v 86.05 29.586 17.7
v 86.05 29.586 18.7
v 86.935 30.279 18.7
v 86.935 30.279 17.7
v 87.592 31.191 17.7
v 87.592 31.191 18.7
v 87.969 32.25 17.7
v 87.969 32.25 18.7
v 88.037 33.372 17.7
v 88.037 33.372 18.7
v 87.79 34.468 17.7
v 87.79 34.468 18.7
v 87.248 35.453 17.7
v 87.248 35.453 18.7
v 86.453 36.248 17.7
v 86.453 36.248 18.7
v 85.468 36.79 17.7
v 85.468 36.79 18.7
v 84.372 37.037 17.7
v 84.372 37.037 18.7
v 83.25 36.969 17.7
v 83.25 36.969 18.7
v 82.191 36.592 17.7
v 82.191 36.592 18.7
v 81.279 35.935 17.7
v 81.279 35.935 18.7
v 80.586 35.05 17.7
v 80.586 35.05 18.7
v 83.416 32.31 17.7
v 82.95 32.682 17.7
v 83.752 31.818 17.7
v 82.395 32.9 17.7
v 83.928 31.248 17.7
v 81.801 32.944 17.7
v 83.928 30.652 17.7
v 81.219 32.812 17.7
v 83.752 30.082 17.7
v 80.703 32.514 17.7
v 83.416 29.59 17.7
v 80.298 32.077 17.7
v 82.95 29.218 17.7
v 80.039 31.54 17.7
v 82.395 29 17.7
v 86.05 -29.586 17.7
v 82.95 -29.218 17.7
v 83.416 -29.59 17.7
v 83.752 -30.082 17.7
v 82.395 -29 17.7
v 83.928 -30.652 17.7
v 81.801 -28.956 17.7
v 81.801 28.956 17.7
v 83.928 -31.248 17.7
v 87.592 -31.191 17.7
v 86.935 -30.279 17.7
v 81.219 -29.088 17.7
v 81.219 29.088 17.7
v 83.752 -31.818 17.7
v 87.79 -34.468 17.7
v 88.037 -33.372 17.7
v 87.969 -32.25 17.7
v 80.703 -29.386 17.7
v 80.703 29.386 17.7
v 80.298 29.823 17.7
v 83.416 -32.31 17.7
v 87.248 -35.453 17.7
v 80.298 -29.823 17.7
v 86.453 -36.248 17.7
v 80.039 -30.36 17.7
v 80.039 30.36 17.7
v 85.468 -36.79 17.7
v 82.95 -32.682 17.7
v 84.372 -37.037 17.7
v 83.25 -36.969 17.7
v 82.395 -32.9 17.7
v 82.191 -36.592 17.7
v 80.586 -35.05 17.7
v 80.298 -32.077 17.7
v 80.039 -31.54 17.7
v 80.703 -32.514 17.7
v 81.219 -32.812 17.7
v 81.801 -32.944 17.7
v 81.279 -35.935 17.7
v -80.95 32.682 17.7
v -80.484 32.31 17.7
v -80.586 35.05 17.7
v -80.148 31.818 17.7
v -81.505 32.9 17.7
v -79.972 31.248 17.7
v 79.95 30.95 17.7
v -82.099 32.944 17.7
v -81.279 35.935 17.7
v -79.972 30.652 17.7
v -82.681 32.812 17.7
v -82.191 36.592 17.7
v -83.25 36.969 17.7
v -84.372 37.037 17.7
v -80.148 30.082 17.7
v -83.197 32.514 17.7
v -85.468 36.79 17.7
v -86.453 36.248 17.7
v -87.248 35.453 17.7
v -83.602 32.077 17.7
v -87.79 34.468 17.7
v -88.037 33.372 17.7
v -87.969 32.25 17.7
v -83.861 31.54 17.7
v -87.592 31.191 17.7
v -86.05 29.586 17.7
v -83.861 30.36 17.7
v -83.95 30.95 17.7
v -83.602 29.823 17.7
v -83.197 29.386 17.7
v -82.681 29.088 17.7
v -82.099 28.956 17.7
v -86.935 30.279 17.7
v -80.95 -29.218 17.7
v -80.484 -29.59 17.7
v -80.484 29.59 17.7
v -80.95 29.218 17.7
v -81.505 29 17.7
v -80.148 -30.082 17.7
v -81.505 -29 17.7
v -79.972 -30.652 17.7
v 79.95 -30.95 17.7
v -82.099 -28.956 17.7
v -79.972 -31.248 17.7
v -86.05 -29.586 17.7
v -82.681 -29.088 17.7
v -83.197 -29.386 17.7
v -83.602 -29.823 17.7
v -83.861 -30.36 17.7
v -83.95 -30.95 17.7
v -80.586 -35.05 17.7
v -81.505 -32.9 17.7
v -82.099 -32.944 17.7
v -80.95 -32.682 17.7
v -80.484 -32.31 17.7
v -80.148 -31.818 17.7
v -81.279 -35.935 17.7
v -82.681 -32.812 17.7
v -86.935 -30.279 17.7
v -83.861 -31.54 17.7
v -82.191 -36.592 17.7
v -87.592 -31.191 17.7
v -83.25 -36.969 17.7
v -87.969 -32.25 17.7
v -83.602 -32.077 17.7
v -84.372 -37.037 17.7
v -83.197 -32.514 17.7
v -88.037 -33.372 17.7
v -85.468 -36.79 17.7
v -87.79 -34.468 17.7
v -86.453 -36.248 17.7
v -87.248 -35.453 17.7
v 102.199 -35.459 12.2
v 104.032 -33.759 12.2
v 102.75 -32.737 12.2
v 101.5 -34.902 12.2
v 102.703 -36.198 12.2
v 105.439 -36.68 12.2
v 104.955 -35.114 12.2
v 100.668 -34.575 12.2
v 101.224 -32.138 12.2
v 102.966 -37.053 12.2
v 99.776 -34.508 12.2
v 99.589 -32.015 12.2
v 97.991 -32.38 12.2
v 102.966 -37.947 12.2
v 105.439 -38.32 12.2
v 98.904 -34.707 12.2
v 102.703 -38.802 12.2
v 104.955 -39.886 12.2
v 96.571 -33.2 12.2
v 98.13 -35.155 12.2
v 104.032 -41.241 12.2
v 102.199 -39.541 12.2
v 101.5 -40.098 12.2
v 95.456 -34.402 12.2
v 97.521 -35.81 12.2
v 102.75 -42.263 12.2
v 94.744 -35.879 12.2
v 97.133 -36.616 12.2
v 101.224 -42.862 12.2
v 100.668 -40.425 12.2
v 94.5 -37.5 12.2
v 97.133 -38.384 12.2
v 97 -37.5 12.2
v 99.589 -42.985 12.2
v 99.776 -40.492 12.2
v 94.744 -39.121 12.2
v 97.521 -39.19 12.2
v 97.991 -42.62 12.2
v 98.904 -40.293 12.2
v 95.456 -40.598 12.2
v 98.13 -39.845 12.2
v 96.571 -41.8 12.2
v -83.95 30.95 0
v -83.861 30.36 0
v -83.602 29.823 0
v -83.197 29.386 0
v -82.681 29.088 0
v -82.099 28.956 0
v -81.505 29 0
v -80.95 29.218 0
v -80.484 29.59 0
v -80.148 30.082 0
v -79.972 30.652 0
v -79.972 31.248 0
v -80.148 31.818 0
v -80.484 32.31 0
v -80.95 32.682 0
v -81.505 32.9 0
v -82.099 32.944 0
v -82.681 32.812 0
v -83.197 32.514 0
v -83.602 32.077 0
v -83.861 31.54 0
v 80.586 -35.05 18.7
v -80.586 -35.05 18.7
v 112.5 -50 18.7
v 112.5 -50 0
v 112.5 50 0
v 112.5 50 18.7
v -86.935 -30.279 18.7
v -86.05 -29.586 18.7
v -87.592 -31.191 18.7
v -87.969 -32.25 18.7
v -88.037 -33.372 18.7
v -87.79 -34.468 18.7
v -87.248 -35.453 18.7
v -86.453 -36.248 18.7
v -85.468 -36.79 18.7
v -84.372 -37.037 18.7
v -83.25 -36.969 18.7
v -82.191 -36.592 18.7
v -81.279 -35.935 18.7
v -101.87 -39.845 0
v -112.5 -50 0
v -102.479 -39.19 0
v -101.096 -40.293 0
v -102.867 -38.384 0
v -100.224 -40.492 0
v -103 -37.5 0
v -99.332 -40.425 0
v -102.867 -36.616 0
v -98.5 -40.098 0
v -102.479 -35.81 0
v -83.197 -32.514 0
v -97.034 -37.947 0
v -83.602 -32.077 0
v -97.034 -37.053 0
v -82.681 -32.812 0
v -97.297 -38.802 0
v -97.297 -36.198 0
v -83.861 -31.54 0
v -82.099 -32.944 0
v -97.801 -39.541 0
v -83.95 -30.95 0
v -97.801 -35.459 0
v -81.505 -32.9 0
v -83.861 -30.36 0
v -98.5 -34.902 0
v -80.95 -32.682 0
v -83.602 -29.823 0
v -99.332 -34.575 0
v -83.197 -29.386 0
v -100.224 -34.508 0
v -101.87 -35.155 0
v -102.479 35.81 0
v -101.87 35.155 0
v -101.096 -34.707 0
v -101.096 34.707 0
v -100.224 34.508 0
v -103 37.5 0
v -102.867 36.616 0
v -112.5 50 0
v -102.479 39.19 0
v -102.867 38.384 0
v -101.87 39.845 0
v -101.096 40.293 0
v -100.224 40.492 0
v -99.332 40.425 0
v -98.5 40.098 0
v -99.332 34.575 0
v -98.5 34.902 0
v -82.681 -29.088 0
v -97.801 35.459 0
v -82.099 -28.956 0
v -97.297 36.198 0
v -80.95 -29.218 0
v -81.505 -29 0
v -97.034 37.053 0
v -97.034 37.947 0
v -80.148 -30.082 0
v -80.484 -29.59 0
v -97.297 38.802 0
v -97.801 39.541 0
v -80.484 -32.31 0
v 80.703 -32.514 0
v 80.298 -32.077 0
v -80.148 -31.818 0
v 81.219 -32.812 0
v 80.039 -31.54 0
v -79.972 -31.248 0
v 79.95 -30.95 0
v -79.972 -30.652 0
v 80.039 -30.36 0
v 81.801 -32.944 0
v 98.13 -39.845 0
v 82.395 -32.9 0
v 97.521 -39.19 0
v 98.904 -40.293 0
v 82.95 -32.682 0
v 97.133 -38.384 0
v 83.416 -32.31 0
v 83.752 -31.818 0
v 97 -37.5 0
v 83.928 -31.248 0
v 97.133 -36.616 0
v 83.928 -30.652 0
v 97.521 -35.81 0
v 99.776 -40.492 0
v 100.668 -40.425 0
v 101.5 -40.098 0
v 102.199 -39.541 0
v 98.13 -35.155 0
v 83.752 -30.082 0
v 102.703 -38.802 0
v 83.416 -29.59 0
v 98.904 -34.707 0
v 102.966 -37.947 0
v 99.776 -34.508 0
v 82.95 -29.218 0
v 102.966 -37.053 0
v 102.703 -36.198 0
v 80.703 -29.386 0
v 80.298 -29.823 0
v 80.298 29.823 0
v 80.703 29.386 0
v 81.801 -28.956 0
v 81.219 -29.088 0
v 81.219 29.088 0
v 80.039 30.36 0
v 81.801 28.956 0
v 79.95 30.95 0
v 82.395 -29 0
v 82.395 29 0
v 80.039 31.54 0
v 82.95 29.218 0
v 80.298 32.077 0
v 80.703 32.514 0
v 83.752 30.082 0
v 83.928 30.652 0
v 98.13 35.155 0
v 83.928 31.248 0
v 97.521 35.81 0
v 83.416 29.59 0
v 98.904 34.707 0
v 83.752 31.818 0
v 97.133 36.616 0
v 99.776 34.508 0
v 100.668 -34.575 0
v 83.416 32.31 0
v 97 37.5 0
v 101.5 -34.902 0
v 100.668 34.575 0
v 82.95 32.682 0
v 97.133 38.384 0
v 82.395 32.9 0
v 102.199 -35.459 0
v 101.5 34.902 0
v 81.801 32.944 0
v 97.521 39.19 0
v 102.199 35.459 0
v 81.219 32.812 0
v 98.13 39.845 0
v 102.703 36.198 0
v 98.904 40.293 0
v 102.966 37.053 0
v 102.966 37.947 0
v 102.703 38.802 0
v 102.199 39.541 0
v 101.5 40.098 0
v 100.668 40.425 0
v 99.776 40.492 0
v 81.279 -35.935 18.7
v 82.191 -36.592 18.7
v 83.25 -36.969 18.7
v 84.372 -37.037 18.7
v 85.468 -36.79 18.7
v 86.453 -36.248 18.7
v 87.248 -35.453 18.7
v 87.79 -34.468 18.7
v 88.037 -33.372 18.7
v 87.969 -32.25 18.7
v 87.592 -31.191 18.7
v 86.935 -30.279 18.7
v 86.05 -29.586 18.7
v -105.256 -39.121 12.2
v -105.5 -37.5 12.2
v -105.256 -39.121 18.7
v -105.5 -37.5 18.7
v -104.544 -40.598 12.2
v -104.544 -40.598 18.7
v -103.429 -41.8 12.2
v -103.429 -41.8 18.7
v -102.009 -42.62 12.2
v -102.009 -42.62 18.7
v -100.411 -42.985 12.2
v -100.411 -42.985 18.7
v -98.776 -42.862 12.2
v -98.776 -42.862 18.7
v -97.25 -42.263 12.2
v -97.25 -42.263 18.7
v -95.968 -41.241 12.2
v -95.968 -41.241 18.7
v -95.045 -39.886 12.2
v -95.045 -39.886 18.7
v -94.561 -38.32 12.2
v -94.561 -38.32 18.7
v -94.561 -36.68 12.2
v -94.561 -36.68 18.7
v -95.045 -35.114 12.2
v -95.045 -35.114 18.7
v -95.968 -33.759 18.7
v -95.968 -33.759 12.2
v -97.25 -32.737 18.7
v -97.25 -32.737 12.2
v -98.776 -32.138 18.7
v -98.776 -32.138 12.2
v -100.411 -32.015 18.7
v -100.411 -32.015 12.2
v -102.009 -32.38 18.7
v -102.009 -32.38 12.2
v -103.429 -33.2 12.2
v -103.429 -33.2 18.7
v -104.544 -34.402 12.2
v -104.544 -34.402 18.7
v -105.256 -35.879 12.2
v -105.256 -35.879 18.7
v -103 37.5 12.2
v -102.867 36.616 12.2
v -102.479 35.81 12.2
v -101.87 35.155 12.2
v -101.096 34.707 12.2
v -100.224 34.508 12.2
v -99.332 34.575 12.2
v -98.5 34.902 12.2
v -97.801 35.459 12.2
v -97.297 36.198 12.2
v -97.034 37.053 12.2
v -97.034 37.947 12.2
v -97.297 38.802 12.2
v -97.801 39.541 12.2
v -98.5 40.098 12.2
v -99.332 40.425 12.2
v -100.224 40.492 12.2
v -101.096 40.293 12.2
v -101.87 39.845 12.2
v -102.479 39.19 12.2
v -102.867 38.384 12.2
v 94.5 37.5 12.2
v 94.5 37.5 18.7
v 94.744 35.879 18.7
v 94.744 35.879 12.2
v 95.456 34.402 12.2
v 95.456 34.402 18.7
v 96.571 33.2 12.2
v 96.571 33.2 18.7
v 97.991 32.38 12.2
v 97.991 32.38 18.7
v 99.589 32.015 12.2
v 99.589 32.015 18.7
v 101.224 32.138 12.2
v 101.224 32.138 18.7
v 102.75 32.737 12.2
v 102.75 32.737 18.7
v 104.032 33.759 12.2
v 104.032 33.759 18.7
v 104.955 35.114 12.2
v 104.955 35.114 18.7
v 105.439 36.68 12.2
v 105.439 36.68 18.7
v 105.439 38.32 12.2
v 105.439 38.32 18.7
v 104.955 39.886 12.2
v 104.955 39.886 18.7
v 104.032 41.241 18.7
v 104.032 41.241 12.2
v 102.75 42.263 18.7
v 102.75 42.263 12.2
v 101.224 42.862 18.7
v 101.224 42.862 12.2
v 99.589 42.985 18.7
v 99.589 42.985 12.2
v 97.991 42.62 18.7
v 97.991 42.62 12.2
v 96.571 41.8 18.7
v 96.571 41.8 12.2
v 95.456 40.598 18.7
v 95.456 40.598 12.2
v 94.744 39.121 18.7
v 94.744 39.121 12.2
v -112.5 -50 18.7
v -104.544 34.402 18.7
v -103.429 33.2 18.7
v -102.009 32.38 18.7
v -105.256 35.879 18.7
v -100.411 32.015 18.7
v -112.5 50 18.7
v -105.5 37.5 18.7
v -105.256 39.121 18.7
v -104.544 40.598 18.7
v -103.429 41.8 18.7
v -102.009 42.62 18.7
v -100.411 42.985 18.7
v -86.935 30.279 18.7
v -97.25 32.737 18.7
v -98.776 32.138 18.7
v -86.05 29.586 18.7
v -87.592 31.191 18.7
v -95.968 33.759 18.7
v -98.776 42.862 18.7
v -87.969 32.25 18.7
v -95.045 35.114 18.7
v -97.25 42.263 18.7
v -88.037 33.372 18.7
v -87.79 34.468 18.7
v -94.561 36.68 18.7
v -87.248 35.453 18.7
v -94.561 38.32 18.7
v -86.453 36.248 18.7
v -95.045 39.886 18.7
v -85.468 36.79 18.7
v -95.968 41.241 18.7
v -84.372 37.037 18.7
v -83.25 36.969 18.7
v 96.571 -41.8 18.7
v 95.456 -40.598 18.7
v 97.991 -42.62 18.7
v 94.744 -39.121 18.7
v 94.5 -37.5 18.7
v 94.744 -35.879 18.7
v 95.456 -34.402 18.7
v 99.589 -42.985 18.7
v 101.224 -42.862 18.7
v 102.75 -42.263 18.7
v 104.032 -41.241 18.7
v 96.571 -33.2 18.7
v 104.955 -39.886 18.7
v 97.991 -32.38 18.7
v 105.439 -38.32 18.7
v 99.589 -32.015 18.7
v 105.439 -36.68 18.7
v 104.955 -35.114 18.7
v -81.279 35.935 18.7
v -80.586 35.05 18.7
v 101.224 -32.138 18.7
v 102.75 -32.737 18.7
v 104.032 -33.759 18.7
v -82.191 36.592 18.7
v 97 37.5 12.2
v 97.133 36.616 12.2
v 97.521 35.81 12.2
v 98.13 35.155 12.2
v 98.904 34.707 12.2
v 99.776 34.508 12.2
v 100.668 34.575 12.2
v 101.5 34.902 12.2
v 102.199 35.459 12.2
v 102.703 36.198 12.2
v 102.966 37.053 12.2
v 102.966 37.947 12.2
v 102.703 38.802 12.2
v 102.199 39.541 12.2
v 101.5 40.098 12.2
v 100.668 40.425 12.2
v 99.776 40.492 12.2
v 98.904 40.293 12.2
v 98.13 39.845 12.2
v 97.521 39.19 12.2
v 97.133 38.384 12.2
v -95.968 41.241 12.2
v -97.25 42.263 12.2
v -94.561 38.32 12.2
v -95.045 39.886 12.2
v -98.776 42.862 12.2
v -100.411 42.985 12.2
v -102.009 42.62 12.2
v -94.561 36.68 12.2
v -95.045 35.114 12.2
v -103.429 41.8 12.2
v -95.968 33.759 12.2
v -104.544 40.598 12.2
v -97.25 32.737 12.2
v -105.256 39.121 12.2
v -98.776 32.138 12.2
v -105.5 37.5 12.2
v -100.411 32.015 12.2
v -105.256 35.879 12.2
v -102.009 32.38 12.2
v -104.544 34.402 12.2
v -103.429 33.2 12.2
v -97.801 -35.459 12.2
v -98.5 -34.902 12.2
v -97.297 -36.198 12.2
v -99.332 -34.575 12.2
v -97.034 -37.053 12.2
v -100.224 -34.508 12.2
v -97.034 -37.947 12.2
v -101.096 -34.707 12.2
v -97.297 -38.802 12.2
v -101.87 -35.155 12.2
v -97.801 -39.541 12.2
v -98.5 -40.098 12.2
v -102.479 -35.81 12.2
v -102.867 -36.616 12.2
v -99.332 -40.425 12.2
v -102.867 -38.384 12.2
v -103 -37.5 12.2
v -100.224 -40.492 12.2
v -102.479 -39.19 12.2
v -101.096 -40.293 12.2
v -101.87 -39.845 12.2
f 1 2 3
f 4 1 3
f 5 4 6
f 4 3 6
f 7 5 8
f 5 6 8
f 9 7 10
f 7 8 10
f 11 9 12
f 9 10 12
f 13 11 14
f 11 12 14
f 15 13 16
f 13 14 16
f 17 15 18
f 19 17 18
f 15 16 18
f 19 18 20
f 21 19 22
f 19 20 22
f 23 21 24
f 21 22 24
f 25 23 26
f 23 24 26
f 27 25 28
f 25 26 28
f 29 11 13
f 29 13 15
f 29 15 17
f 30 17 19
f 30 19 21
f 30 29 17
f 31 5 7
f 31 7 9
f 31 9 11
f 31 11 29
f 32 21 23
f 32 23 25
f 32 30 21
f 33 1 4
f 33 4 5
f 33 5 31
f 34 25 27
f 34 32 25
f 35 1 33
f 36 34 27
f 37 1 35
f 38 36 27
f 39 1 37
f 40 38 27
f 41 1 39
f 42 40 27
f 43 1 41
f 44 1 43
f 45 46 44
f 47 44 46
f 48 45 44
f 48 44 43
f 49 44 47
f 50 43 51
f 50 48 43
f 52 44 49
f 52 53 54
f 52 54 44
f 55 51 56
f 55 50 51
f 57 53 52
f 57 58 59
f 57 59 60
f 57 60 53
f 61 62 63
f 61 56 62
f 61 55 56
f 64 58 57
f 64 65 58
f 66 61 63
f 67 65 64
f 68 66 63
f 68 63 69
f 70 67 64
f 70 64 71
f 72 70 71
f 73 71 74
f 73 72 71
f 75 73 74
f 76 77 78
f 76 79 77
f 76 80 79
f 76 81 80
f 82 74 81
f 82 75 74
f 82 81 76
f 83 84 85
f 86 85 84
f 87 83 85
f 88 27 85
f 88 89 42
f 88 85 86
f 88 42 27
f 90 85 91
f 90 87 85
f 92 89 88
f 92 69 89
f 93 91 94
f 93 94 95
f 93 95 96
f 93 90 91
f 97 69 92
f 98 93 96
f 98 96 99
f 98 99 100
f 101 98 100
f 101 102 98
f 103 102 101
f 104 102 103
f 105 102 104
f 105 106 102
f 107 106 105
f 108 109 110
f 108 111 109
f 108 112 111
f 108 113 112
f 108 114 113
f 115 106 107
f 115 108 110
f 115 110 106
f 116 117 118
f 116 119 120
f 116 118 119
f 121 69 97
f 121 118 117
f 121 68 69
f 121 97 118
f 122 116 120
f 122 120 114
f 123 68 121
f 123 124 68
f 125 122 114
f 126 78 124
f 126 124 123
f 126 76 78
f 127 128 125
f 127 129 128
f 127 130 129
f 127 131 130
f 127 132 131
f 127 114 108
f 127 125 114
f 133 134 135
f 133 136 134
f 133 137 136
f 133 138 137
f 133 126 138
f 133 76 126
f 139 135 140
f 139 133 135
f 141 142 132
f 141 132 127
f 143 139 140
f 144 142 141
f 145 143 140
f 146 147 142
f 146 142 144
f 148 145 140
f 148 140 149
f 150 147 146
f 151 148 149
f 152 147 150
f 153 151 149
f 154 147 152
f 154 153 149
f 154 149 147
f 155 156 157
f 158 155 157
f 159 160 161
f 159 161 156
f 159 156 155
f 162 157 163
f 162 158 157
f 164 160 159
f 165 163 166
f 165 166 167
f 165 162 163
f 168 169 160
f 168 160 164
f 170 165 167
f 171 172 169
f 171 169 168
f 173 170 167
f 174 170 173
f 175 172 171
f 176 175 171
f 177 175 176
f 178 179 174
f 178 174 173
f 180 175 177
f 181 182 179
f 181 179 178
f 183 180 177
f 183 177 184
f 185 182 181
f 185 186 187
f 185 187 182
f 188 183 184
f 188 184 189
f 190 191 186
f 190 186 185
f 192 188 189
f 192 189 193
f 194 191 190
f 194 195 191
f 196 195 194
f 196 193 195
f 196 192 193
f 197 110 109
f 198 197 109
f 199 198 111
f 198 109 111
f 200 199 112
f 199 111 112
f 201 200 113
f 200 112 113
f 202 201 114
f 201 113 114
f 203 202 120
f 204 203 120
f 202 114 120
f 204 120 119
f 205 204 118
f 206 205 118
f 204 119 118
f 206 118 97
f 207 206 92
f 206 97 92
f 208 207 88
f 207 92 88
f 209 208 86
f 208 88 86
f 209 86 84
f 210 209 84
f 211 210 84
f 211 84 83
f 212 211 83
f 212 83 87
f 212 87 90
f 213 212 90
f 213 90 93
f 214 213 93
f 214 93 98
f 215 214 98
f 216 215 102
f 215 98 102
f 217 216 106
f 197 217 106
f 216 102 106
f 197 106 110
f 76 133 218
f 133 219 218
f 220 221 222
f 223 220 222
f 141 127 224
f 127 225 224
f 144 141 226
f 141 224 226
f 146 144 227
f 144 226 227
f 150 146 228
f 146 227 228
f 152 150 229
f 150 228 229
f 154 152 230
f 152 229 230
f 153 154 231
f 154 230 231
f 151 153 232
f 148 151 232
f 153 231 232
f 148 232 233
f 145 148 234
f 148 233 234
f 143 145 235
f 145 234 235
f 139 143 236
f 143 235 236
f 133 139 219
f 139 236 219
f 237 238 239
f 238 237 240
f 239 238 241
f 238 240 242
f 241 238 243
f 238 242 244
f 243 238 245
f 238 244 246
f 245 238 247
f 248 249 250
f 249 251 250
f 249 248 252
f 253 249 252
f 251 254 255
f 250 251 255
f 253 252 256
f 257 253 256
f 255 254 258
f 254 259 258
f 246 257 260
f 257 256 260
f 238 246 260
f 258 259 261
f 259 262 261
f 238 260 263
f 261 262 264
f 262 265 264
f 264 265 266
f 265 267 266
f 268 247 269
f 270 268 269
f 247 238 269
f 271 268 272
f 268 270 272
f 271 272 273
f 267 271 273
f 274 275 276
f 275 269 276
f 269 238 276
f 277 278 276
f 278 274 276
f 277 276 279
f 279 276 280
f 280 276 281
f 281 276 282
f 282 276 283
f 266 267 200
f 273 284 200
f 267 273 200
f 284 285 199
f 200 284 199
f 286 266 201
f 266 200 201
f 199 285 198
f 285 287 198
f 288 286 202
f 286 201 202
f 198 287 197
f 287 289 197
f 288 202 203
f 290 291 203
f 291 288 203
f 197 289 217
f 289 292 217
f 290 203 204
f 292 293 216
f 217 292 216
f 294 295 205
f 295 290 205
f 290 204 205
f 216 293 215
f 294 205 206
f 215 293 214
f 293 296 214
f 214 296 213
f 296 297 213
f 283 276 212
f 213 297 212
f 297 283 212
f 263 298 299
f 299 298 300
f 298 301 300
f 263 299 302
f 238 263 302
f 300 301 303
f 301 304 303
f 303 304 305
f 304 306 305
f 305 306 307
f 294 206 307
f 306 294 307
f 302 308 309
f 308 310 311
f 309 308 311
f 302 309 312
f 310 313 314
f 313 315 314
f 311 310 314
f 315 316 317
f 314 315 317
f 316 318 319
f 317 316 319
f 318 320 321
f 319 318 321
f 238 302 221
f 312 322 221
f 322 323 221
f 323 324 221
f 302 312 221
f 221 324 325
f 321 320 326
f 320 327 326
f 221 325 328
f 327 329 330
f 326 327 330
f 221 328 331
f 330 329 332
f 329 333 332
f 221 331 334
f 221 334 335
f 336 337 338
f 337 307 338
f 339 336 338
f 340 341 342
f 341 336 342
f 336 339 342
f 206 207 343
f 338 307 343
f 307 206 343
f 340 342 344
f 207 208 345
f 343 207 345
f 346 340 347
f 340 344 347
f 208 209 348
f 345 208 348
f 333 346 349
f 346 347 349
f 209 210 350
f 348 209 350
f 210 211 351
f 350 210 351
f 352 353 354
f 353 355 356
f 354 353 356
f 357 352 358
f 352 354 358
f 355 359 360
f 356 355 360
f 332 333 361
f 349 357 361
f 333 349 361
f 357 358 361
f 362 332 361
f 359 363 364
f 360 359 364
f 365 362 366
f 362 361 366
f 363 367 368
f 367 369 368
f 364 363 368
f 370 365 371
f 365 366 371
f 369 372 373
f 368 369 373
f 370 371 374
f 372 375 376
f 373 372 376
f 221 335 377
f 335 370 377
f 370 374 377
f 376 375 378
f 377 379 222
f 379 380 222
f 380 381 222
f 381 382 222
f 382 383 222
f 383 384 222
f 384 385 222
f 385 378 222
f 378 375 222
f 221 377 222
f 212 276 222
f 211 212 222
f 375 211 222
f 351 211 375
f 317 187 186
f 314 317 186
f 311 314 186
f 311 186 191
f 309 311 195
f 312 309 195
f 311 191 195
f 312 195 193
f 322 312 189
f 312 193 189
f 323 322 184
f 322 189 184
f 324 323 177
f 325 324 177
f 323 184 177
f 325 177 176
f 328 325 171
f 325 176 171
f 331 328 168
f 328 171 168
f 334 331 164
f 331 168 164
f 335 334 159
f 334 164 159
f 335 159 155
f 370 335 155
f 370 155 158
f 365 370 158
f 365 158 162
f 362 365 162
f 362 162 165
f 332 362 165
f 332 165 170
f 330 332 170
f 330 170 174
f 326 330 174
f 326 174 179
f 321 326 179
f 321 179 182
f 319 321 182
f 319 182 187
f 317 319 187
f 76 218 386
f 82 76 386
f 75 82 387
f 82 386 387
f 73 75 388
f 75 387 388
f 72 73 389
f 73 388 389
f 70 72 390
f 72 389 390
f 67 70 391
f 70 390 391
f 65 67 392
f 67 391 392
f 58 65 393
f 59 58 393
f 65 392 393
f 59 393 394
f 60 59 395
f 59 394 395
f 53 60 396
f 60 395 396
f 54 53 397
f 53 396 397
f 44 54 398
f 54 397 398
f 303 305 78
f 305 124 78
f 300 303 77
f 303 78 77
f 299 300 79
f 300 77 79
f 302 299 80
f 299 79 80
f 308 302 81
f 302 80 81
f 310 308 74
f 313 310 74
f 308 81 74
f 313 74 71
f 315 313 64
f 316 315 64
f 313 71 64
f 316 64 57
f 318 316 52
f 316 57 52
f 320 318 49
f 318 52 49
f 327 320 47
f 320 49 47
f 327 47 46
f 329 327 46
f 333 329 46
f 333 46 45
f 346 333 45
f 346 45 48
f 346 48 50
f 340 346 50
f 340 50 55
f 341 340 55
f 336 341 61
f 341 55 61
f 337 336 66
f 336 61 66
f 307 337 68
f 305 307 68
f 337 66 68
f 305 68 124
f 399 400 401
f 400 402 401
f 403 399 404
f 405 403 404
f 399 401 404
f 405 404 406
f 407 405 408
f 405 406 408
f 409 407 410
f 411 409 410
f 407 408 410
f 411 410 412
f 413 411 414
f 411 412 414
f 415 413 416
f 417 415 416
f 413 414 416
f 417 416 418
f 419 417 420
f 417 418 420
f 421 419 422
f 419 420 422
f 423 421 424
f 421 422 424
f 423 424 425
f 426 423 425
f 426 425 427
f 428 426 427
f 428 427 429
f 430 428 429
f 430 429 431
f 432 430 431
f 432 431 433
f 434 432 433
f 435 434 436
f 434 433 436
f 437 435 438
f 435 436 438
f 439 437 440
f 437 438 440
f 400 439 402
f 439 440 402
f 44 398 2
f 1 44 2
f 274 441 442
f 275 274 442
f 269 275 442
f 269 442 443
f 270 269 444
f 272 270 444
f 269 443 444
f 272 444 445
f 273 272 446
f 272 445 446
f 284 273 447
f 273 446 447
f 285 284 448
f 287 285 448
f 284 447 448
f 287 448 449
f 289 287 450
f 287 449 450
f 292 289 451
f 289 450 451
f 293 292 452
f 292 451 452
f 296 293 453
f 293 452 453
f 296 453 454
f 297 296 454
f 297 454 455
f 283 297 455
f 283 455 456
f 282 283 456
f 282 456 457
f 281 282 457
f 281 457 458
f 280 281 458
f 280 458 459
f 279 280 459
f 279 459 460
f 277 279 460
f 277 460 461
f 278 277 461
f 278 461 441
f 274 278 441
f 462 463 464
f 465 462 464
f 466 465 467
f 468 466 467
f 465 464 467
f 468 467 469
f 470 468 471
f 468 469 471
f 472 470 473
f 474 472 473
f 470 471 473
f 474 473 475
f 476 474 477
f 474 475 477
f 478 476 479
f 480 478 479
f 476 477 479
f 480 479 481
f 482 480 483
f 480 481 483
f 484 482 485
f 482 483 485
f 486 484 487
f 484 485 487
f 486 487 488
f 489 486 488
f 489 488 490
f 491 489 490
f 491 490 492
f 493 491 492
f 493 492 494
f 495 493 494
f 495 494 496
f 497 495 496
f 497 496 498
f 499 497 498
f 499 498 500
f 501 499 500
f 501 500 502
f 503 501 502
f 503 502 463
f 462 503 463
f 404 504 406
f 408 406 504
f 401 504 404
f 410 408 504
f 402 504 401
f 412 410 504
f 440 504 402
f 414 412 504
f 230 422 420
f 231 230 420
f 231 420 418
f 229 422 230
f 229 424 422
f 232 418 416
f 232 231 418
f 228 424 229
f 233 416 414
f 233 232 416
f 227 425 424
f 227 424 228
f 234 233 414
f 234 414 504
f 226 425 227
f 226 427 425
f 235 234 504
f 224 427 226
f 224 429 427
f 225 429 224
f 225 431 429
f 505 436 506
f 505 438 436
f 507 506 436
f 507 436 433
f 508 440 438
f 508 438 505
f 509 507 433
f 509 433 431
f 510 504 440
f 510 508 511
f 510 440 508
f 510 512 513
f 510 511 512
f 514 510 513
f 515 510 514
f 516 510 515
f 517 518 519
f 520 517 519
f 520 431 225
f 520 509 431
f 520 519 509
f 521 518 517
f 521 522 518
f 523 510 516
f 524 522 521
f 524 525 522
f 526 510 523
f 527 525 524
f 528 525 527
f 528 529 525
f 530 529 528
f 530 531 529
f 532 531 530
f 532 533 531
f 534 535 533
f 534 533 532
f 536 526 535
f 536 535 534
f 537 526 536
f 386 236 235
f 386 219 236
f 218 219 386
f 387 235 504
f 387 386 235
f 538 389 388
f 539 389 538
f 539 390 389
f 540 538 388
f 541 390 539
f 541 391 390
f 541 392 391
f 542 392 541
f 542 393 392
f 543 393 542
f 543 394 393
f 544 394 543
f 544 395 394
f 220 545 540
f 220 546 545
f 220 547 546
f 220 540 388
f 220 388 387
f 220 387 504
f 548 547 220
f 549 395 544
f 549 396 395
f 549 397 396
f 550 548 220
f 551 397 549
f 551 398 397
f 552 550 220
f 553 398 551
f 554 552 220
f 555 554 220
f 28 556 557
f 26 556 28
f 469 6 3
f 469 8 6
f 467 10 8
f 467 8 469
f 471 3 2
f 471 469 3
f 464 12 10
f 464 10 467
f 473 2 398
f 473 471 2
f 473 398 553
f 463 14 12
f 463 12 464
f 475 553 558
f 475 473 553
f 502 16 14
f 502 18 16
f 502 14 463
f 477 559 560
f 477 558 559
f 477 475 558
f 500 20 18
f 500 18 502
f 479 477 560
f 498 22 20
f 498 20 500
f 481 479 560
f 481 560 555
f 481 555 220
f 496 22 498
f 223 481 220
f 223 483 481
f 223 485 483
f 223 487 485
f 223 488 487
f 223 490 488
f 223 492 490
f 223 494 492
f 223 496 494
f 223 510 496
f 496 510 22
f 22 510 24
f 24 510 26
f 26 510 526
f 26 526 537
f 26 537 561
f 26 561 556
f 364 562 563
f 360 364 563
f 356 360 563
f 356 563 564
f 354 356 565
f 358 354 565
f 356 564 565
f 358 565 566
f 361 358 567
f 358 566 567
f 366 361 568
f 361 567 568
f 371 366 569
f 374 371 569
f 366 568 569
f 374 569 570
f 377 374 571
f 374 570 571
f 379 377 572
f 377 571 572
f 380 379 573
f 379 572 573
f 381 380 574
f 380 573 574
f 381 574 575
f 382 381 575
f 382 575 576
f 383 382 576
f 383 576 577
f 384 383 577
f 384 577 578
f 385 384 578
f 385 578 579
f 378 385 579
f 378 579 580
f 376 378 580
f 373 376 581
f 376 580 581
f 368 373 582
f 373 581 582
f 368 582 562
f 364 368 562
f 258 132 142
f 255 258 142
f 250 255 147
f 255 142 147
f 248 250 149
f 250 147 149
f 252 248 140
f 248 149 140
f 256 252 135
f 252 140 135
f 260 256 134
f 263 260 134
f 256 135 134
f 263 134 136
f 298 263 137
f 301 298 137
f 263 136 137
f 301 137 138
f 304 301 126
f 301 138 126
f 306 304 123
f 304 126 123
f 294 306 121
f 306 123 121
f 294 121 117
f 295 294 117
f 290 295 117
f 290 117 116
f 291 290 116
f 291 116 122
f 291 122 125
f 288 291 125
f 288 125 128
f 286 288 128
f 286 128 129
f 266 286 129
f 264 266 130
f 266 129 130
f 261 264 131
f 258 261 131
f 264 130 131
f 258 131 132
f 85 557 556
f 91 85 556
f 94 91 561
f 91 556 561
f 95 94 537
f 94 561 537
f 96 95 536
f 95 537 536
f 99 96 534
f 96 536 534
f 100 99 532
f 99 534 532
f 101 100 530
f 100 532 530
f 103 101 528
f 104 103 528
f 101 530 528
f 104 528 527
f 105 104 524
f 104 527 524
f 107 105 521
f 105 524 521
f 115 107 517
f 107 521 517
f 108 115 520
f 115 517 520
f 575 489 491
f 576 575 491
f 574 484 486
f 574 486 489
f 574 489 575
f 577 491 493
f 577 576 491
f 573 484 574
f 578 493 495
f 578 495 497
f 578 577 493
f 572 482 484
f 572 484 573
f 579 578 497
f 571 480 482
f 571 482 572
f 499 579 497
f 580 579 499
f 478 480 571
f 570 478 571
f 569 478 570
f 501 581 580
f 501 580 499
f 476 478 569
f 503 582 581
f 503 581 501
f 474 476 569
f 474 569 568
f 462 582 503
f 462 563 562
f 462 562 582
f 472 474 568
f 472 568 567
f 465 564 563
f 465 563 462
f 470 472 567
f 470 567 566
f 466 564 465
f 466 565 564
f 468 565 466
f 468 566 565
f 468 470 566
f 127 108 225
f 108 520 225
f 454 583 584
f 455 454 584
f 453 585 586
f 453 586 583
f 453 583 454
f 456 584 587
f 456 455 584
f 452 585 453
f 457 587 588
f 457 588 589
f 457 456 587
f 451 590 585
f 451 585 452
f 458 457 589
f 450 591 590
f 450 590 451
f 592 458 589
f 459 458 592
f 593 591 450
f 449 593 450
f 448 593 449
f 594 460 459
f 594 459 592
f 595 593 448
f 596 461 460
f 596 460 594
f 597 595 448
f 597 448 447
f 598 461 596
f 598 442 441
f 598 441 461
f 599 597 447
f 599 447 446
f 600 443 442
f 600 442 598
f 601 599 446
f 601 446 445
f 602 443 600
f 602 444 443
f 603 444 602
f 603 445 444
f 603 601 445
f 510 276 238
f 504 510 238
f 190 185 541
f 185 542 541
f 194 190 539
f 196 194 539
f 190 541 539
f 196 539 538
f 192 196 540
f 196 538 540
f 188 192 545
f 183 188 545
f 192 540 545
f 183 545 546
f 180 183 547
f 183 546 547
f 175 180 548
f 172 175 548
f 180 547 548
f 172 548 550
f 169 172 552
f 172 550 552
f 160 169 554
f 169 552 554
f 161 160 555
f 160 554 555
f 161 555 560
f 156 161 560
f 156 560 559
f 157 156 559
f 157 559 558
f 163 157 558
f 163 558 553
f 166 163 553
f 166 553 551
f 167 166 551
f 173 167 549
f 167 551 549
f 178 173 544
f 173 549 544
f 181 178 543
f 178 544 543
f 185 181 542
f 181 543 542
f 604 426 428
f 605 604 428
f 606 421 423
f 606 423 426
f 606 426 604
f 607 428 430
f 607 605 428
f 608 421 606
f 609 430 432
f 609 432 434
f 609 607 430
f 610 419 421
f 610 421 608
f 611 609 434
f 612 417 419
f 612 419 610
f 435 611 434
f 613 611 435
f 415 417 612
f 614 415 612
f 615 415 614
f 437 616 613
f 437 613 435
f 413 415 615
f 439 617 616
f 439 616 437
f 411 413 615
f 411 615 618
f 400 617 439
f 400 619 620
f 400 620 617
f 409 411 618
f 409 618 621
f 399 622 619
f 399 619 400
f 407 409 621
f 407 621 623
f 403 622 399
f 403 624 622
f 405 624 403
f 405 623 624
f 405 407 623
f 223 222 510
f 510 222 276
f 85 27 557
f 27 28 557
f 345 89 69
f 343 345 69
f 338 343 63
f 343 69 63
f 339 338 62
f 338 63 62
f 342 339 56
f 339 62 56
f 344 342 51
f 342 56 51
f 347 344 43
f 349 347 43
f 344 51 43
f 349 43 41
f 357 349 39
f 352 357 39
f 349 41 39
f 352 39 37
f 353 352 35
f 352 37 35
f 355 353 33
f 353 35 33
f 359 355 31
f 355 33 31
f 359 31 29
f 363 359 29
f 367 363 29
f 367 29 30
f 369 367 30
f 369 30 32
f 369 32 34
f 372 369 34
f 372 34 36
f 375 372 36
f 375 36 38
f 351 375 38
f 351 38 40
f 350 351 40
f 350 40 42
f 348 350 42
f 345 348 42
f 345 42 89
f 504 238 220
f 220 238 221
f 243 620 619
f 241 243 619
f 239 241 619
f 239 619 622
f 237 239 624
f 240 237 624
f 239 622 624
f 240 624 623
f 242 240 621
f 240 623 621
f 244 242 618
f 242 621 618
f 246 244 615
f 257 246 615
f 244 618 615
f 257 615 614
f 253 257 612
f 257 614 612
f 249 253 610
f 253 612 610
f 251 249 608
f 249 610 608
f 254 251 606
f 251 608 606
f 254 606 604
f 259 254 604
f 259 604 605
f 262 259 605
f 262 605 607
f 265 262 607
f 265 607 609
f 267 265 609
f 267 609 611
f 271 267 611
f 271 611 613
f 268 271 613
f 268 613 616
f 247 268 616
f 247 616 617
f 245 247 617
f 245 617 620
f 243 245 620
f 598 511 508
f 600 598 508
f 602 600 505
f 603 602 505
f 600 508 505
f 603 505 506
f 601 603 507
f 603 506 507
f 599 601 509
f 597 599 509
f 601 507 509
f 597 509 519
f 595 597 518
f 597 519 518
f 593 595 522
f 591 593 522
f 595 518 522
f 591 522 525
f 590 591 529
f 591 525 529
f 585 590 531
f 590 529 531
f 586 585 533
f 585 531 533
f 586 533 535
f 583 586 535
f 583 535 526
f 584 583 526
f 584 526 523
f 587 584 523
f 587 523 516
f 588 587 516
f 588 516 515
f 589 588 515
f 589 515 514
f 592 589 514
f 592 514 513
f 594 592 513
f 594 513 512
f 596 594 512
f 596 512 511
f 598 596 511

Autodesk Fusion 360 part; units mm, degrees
sketch "Sketch14" plane through (0, 0, 0) normal (0, 0, 1) x (1, 0, 0)
  line L0 (-112.5, -50) -> (112.5, -50)
  line L1 (112.5, -50) -> (112.5, 50)
  line L2 (112.5, 50) -> (-112.5, 50)
  line L3 (-112.5, 50) -> (-112.5, -50)
  line L4 (-112.5, -50) -> (112.5, 50) construction
  line L5 (112.5, -50) -> (-112.5, 50) construction
  dimension "d46" = 225
  dimension "d47" = 100
extrude "Extrude10" add sketch "Sketch14" along normal blind 18.7
sketch "Sketch15" plane through (0, 0, 18.7) normal (0, 0, 1) x (-1, 0, 0)
  line L0 (112.5, -50) -> (112.5, 50)
  line L1 (112.5, 50) -> (-112.5, 50)
  line L2 (-112.5, 50) -> (-112.5, -50)
  line L3 (-112.5, -50) -> (112.5, -50)
  line L4 (80.5859, 35.05) -> (-80.5859, 35.05)
  line L5 (-86.05, 29.5859) -> (-86.05, -29.5859)
  line L6 (-80.5859, -35.05) -> (80.5859, -35.05)
  line L7 (86.05, -29.5859) -> (86.05, 29.5859)
  line L8 (86.05, 35.05) -> (-86.05, -35.05) construction
  line L9 (-86.05, 35.05) -> (86.05, -35.05) construction
  line L10 (0, -40) -> (0, 40) construction
  line L11 (90, 0) -> (-90, 0) construction
  arc A0 (80.5859, -35.05) -> (86.05, -29.5859) centre (84.05, -33.05) ccw
  arc A1 (-86.05, -29.5859) -> (-80.5859, -35.05) centre (-84.05, -33.05) ccw
  arc A2 (-80.5859, 35.05) -> (-86.05, 29.5859) centre (-84.05, 33.05) ccw
  arc A3 (86.05, 29.5859) -> (80.5859, 35.05) centre (84.05, 33.05) ccw
  dimension "d50" = 172.1
  dimension "d51" = 70.1
  dimension "d89" = 8
  dimension "d90" = 2
  dimension "d91" = 2
extrude "Extrude11" cut sketch "Sketch15" against normal blind 1 contours L4 L5 L6 L7 A0 A1 A2 A3
sketch "Sketch16" plane through (0, 0, 18.7) normal (0, 0, 1) x (-1, 0, 0)
  line L0 (86.1, -35.1) -> (86.1, 35.1)
  line L1 (86.1, 35.1) -> (-86.1, 35.1)
  line L2 (-86.1, 35.1) -> (-86.1, -35.1)
  line L3 (-86.1, -35.1) -> (86.1, -35.1)
  circle A0 centre (100, -37.5) radius 5.5
  circle A1 centre (100, 37.5) radius 5.5
  circle A2 centre (-100, -37.5) radius 5.5
  circle A3 centre (-100, 37.5) radius 5.5
  line L4 (112.5, -50) -> (112.5, 50)
  line L5 (-112.5, -50) -> (112.5, -50)
  line L6 (112.5, 50) -> (-112.5, 50)
  line L7 (-112.5, 50) -> (-112.5, -50)
  line L8 (-80.5859, 35.05) -> (80.5859, 35.05)
  line L9 (86.05, 29.5859) -> (86.05, -29.5859)
  line L10 (80.5859, -35.05) -> (-80.5859, -35.05)
  line L11 (-86.05, -29.5859) -> (-86.05, 29.5859)
  line L12 (112.5, -50) -> (112.5, 50)
  line L13 (112.5, 50) -> (-112.5, 50)
  line L14 (-112.5, 50) -> (-112.5, -50)
  line L15 (-112.5, -50) -> (112.5, -50)
  arc A4 (86.05, 29.5859) -> (80.5859, 35.05) centre (84.05, 33.05) ccw
  arc A5 (80.5859, -35.05) -> (86.05, -29.5859) centre (84.05, -33.05) ccw
  arc A6 (-86.05, -29.5859) -> (-80.5859, -35.05) centre (-84.05, -33.05) ccw
  arc A7 (-80.5859, 35.05) -> (-86.05, 29.5859) centre (-84.05, 33.05) ccw
  dimension "d54" = 11
  dimension "d55" = 11
  dimension "d56" = 11
  dimension "d57" = 11
  dimension "d58" = 12.5
  dimension "d59" = 12.5
  dimension "d60" = 12.5
  dimension "d61" = 12.5
  dimension "d62" = 12.5
  dimension "d63" = 12.5
  dimension "d64" = 12.5
  dimension "d65" = 12.5
extrude "Extrude12" cut sketch "Sketch16" against normal blind 6.5 contours A0 | A1 | A2 | A3
sketch "Sketch17" plane through (0, 0, 12.2) normal (0, 0, 1) x (-1, 0, 0)
  circle A0 centre (100, -37.5) radius 5.5
  circle A1 centre (100, -37.5) radius 3
  dimension "d68" = 6
sketch "Sketch18" plane through (0, 0, 12.2) normal (0, 0, 1) x (-1, 0, 0)
  circle A0 centre (-100, -37.5) radius 5.5
  circle A1 centre (-100, -37.5) radius 3
  dimension "d69" = 6
sketch "Sketch19" plane through (0, 0, 12.2) normal (0, 0, 1) x (-1, 0, 0)
  circle A0 centre (-100, 37.5) radius 5.5
  circle A1 centre (-100, 37.5) radius 3
  dimension "d70" = 6
sketch "Sketch20" plane through (0, 0, 12.2) normal (0, 0, 1) x (-1, 0, 0)
  circle A0 centre (100, 37.5) radius 5.5
  circle A1 centre (100, 37.5) radius 3
  dimension "d71" = 6
extrude "Extrude13" cut sketch "Sketch18" sketch "Sketch17" sketch "Sketch20" sketch "Sketch19" along normal up to surface contours A1 of sketch 2 contours A1 of sketch 3 contours A1 of sketch 4 contours A1 end surface through (0, 0, 0) normal (0, 0, -1) offset 0
sketch "Sketch21" plane through (0, 0, 17.7) normal (0, 0, 1) x (-1, 0, 0)
  line L0 (86.05, -29.5859) -> (86.05, 29.5859)
  line L1 (80.5859, 35.05) -> (-80.5859, 35.05)
  line L2 (-86.05, 29.5859) -> (-86.05, -29.5859)
  line L3 (-80.5859, -35.05) -> (80.5859, -35.05)
  circle A0 centre (81.95, -30.95) radius 2
  circle A1 centre (-81.95, -30.95) radius 2
  circle A2 centre (-81.95, 30.95) radius 2
  circle A3 centre (81.95, 30.95) radius 2
  arc A4 (86.05, 29.5859) -> (80.5859, 35.05) centre (84.05, 33.05) ccw
  arc A5 (-80.5859, 35.05) -> (-86.05, 29.5859) centre (-84.05, 33.05) ccw
  arc A6 (-86.05, -29.5859) -> (-80.5859, -35.05) centre (-84.05, -33.05) ccw
  arc A7 (80.5859, -35.05) -> (86.05, -29.5859) centre (84.05, -33.05) ccw
  dimension "d74" = 4
  dimension "d75" = 4
  dimension "d76" = 4
  dimension "d77" = 4
  dimension "d78" = 4.1
  dimension "d79" = 4.1
  dimension "d80" = 4.1
  dimension "d81" = 4.1
  dimension "d82" = 4.1
  dimension "d83" = 4.1
  dimension "d84" = 4.1
  dimension "d85" = 4.1
extrude "Extrude14" cut sketch "Sketch21" against normal blind 20 contours A0 | A1 | A2 | A3
thread "Thread1"
sketch "Sketch4" plane through (0, 0, 2) normal (0, 0, 1) x (-1, 0, 0)
  circle A0 centre (-75, -25) radius 5.5
  circle A1 centre (-75, -25) radius 3.1
  dimension "d20" = 6.2
sketch "Sketch5" plane through (0, 0, 2) normal (0, 0, 1) x (-1, 0, 0)
  circle A0 centre (-75, 25) radius 5.5
  circle A1 centre (-75, 25) radius 3.1
  dimension "d21" = 6.2
sketch "Sketch6" plane through (0, 0, 2) normal (0, 0, 1) x (-1, 0, 0)
  circle A0 centre (75, 25) radius 5.5
  circle A1 centre (75, 25) radius 3.1
  dimension "d22" = 6.2
